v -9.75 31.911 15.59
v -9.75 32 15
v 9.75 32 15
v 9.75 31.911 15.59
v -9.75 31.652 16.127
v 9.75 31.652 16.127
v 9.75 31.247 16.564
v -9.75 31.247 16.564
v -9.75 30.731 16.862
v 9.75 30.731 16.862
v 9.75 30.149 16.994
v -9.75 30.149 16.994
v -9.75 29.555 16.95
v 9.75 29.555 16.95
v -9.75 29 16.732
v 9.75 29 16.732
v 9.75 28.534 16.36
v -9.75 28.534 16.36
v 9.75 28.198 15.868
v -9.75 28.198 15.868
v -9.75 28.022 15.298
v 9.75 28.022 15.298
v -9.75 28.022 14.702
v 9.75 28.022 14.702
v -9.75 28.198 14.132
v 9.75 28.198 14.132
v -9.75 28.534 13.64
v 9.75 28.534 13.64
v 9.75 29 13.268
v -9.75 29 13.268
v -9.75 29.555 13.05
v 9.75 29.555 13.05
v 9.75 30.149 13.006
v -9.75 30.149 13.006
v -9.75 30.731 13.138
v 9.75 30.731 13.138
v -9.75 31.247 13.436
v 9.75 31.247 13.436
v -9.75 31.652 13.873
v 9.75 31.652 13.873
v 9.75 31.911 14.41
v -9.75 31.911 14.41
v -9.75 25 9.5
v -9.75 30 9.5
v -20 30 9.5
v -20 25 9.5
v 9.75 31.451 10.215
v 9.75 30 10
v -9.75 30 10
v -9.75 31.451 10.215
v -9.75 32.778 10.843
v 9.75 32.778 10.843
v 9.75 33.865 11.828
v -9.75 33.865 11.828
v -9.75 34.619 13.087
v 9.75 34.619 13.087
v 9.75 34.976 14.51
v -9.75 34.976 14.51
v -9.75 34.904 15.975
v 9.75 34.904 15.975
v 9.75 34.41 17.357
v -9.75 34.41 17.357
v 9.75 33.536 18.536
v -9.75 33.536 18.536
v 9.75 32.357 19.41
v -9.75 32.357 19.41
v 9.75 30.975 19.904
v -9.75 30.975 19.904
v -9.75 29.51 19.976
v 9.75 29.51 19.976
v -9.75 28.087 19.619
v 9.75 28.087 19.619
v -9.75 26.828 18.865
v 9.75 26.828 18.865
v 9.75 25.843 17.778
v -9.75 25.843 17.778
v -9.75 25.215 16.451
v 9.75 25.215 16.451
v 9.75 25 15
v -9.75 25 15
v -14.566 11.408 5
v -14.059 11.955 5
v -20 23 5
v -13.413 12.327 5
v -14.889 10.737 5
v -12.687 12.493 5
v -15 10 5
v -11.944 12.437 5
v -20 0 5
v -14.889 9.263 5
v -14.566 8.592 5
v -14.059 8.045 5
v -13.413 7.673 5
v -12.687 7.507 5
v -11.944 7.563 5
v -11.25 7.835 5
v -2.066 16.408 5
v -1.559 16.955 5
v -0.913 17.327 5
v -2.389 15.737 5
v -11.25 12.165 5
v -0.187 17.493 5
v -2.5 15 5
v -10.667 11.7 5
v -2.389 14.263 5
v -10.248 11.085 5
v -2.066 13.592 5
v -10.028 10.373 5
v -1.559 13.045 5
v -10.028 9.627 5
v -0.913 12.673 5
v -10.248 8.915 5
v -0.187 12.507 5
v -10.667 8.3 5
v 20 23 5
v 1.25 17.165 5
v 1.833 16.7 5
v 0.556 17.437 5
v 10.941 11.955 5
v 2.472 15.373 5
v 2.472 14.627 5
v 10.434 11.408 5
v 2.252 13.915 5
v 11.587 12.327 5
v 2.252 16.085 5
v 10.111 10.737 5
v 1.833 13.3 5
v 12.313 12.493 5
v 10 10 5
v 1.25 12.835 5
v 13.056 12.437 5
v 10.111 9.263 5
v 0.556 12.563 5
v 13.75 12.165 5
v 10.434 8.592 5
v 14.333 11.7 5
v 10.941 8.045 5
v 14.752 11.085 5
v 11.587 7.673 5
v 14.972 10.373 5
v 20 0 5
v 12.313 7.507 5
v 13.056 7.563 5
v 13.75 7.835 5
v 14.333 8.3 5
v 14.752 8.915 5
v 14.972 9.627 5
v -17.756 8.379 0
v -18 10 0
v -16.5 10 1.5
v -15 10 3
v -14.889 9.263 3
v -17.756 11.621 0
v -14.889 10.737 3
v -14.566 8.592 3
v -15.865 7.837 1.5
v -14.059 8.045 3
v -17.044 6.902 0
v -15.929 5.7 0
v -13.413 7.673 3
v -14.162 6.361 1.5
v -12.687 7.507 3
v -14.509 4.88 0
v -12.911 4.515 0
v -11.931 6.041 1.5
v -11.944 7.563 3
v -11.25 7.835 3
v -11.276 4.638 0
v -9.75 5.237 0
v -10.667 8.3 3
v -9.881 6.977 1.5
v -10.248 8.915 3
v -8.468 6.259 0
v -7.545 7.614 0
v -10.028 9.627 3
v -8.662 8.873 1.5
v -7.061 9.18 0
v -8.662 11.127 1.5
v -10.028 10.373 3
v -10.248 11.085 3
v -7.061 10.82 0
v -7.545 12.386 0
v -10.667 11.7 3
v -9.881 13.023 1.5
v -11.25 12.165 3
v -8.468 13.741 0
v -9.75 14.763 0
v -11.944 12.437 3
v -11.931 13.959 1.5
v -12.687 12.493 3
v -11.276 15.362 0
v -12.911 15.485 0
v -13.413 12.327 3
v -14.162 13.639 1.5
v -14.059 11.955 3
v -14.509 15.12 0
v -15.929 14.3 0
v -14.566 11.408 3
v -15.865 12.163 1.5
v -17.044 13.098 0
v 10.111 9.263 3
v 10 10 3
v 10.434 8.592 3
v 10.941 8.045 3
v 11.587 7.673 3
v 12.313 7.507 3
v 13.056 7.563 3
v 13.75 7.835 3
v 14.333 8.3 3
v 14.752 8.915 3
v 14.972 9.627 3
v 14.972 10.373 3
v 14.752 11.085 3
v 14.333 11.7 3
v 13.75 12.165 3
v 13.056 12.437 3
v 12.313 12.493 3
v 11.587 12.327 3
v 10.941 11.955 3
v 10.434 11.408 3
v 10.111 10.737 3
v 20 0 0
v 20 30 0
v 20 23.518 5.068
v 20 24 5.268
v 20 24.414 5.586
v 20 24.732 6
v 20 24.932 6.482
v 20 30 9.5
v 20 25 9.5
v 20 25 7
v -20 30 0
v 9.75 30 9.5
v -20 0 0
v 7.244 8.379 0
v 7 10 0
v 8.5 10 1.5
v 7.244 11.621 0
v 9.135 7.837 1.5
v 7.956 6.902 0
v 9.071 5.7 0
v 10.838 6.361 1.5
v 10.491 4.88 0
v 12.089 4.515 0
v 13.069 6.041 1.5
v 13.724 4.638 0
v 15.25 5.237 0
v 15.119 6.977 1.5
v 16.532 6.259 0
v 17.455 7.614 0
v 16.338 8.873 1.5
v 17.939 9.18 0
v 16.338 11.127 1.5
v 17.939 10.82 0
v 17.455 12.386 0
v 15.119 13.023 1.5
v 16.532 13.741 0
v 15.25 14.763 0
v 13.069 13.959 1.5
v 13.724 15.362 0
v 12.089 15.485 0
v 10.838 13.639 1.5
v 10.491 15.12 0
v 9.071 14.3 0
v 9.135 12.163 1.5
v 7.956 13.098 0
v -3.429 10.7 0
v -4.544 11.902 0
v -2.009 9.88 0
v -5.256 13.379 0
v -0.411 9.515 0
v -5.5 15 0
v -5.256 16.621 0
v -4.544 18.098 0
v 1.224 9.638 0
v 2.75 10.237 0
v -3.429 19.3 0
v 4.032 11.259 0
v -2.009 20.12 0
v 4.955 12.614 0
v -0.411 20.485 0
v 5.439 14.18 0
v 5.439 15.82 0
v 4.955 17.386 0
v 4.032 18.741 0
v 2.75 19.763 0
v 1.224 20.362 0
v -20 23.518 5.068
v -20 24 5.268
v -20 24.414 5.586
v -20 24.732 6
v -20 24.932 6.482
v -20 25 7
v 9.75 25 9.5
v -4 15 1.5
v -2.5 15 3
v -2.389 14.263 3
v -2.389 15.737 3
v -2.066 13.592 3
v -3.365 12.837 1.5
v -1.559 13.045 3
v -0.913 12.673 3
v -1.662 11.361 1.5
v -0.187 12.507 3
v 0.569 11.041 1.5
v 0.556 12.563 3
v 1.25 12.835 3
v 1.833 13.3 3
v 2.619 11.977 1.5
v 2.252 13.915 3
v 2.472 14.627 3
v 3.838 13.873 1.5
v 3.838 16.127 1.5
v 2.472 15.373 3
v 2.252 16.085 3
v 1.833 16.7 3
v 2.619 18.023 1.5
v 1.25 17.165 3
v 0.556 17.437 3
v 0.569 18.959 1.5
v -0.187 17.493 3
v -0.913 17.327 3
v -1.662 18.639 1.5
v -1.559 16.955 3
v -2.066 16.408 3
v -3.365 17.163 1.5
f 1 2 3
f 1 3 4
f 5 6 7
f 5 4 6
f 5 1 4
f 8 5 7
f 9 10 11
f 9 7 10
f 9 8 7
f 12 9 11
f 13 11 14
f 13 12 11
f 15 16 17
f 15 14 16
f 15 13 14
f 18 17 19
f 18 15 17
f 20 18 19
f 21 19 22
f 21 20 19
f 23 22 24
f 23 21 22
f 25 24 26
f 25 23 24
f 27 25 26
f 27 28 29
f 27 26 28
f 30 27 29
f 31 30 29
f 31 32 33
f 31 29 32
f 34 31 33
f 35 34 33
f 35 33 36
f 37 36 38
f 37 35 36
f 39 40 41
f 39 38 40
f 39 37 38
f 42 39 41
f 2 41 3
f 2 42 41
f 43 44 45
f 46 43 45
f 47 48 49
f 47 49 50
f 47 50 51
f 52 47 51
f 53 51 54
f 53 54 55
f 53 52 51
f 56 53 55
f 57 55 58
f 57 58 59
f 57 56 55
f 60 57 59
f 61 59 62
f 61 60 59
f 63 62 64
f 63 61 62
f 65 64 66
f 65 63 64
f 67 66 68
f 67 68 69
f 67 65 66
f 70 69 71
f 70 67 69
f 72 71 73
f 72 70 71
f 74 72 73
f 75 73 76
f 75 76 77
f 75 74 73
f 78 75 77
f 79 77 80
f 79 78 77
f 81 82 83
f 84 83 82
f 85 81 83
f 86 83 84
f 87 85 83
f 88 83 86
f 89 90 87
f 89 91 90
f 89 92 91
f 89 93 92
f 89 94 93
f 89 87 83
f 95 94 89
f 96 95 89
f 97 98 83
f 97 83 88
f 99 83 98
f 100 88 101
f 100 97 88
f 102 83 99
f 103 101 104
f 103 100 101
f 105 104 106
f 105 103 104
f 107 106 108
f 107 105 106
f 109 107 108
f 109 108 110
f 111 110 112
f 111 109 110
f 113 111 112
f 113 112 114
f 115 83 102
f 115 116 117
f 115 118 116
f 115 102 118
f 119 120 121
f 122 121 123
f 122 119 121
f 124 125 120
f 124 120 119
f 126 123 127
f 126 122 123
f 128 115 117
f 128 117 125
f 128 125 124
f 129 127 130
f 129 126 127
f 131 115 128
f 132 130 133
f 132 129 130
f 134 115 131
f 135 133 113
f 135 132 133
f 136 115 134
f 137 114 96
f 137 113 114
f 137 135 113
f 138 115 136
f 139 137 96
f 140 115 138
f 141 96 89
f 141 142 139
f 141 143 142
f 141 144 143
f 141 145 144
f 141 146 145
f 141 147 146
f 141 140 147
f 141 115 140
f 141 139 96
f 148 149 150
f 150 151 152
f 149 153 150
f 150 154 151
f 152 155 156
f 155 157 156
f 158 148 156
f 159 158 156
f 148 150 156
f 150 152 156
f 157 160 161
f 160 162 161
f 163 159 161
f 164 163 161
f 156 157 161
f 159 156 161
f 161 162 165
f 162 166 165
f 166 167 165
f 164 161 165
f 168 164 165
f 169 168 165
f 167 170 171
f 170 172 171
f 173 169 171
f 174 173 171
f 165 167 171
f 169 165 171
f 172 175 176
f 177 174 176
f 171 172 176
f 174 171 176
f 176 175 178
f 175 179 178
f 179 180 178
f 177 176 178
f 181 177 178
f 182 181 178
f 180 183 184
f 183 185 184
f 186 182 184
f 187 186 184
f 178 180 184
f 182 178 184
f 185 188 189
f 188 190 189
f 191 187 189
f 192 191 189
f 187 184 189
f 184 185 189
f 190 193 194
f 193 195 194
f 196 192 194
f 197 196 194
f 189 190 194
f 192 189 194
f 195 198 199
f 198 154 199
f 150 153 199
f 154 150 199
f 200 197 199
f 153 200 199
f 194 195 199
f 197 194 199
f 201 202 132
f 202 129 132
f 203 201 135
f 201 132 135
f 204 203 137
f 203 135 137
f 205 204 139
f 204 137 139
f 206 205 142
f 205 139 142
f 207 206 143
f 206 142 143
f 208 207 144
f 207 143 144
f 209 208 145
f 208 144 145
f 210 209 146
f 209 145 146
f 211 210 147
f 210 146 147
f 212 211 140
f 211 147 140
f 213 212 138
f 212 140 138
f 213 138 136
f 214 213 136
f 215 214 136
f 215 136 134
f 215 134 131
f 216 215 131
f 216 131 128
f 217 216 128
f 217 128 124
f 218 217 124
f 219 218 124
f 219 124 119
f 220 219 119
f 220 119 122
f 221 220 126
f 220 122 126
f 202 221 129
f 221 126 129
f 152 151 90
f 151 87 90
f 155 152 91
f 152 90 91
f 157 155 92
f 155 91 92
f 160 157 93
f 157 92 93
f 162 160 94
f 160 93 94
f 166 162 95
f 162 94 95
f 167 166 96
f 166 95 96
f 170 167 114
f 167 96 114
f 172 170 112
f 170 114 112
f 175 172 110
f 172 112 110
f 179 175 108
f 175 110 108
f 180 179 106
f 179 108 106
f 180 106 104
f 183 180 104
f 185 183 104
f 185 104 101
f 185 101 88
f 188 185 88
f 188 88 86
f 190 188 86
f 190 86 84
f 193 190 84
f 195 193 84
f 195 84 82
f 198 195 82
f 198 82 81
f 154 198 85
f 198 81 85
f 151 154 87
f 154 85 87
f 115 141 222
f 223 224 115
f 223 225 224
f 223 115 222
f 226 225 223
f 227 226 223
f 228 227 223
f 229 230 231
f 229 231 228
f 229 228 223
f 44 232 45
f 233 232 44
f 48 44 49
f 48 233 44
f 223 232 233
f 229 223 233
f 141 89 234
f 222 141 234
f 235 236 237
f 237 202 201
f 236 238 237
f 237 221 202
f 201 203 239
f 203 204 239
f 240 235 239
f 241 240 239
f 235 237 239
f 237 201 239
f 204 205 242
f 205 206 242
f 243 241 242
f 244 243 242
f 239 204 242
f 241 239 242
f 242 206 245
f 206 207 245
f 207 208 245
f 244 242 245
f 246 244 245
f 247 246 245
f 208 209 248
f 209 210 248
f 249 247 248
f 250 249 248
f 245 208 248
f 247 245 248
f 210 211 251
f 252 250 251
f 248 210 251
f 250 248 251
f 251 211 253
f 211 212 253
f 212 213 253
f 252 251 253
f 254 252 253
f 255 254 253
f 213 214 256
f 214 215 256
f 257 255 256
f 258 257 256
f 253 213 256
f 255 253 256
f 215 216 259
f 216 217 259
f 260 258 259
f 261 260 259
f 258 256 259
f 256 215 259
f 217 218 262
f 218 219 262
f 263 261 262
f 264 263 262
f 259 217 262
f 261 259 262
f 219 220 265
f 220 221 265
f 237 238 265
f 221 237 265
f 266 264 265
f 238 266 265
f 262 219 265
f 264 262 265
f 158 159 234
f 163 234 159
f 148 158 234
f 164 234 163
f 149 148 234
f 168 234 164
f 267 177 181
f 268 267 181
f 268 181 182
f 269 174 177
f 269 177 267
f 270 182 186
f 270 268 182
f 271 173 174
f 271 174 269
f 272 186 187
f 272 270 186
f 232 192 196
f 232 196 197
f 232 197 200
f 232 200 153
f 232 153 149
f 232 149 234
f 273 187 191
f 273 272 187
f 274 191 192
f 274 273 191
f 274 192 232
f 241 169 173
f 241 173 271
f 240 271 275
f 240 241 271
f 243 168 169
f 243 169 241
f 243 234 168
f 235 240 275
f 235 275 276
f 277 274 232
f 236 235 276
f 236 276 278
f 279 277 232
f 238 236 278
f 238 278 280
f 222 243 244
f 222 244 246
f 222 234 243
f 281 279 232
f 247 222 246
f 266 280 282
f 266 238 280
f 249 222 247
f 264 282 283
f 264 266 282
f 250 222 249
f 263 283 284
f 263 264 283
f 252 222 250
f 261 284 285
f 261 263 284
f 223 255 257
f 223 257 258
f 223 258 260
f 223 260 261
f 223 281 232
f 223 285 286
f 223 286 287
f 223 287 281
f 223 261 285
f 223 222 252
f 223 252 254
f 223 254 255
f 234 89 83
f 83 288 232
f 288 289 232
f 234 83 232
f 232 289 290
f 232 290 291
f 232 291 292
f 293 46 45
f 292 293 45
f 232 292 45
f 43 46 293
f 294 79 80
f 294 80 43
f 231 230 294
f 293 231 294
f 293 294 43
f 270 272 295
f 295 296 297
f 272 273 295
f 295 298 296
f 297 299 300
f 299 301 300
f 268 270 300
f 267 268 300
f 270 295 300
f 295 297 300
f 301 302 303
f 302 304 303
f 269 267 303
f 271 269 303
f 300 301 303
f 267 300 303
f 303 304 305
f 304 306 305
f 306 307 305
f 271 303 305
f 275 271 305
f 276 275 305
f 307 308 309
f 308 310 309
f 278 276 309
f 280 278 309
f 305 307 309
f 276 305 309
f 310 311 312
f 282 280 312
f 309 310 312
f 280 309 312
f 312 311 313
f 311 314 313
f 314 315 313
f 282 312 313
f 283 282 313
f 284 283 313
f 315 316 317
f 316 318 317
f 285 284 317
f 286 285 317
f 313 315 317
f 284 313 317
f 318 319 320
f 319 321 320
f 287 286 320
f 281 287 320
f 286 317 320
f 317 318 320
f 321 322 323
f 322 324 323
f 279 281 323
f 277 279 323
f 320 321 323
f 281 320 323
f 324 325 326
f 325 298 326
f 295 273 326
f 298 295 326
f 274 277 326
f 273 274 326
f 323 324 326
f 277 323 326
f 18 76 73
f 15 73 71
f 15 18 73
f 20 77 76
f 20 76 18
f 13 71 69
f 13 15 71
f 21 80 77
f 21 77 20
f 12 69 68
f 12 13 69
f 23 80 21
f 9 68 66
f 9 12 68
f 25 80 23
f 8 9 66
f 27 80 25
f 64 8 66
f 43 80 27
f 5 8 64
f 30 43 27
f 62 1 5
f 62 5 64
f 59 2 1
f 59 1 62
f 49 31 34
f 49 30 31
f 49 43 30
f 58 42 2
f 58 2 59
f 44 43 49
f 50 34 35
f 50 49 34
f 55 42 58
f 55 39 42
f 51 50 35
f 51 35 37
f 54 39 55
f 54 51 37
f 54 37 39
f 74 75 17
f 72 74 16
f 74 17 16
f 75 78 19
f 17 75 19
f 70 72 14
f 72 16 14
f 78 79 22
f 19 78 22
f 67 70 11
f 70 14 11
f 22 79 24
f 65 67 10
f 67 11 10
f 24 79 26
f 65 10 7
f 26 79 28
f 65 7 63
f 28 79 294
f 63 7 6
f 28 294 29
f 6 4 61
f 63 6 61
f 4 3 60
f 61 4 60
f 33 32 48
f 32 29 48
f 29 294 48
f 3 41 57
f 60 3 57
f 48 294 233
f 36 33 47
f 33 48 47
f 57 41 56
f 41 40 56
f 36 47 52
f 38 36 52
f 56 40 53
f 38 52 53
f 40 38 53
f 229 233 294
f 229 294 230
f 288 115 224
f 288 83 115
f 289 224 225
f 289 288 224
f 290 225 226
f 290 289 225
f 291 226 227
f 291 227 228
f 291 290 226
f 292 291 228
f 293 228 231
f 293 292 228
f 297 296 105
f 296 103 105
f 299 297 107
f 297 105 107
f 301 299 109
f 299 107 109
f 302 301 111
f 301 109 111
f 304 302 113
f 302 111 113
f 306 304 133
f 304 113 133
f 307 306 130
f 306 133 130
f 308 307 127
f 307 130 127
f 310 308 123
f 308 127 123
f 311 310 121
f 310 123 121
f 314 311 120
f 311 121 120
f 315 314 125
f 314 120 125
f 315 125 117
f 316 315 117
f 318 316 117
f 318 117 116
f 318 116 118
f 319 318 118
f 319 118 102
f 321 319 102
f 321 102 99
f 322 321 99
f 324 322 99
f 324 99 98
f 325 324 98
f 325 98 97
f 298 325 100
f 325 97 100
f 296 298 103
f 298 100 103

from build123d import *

# Parameters (mm, degrees)
F0_R           = 2
F1_DEPTH       = 20
F3_W           = 10.25
F3_H           = 12
F4_DEPTH       = 10.501
F5_R           = 2
F7_D           = 5
F7_CSINK_D     = 11
F7_CSINK_ANGLE = 90


# Not quite as in the source:
# - a pattern or mirror of a feature is missing from the dataset's text; its kind, count and spacing are read off the source's solid


with BuildPart() as f1:
    # F0 (on Right) → F1 (new body, symmetric)
    with BuildSketch(Plane.YZ):
        with BuildLine():
            Line((0, 5), (0, 0))
            Line((0, 0), (30, 0))
            Line((30, 0), (30, 10))
            ThreePointArc((30, 10), (33.5355339059, 18.5355339059), (25, 15))
            Line((25, 15), (25, 5))
            Line((25, 5), (0, 5))
        make_face()
        with Locations((30, 15)):
            Circle(F0_R, mode=Mode.SUBTRACT)
    extrude(amount=F1_DEPTH, both=True)

    # F3 (on offset) → F4 (cut, through all)
    with BuildSketch(Plane.XY.offset(9.5)):
        with Locations((14.875, 31)):
            Rectangle(F3_W, F3_H)
    f4 = extrude(amount=F4_DEPTH, mode=Mode.SUBTRACT)

    # F4_copies: F4 across plane
    add(f4.mirror(Plane(origin=(0, 0, 0), x_dir=(0, 0, -1), z_dir=(-1, 0, 0))), mode=Mode.SUBTRACT)

    # F5
    f5_edges = [f1.edges().sort_by_distance(p)[0] for p in [
        (0, 25, 5),
    ]]
    fillet(f5_edges, radius=F5_R)

    # F7 (through all)
    with Locations(Plane(origin=(0, 0, 0), x_dir=(1, 0, 0), z_dir=(0, 0, -1))):
        with Locations((-12.5, -10), (0, -15), (12.5, -10)):
            CounterSinkHole(F7_D / 2, F7_CSINK_D / 2, counter_sink_angle=F7_CSINK_ANGLE)


solid = f1.part
